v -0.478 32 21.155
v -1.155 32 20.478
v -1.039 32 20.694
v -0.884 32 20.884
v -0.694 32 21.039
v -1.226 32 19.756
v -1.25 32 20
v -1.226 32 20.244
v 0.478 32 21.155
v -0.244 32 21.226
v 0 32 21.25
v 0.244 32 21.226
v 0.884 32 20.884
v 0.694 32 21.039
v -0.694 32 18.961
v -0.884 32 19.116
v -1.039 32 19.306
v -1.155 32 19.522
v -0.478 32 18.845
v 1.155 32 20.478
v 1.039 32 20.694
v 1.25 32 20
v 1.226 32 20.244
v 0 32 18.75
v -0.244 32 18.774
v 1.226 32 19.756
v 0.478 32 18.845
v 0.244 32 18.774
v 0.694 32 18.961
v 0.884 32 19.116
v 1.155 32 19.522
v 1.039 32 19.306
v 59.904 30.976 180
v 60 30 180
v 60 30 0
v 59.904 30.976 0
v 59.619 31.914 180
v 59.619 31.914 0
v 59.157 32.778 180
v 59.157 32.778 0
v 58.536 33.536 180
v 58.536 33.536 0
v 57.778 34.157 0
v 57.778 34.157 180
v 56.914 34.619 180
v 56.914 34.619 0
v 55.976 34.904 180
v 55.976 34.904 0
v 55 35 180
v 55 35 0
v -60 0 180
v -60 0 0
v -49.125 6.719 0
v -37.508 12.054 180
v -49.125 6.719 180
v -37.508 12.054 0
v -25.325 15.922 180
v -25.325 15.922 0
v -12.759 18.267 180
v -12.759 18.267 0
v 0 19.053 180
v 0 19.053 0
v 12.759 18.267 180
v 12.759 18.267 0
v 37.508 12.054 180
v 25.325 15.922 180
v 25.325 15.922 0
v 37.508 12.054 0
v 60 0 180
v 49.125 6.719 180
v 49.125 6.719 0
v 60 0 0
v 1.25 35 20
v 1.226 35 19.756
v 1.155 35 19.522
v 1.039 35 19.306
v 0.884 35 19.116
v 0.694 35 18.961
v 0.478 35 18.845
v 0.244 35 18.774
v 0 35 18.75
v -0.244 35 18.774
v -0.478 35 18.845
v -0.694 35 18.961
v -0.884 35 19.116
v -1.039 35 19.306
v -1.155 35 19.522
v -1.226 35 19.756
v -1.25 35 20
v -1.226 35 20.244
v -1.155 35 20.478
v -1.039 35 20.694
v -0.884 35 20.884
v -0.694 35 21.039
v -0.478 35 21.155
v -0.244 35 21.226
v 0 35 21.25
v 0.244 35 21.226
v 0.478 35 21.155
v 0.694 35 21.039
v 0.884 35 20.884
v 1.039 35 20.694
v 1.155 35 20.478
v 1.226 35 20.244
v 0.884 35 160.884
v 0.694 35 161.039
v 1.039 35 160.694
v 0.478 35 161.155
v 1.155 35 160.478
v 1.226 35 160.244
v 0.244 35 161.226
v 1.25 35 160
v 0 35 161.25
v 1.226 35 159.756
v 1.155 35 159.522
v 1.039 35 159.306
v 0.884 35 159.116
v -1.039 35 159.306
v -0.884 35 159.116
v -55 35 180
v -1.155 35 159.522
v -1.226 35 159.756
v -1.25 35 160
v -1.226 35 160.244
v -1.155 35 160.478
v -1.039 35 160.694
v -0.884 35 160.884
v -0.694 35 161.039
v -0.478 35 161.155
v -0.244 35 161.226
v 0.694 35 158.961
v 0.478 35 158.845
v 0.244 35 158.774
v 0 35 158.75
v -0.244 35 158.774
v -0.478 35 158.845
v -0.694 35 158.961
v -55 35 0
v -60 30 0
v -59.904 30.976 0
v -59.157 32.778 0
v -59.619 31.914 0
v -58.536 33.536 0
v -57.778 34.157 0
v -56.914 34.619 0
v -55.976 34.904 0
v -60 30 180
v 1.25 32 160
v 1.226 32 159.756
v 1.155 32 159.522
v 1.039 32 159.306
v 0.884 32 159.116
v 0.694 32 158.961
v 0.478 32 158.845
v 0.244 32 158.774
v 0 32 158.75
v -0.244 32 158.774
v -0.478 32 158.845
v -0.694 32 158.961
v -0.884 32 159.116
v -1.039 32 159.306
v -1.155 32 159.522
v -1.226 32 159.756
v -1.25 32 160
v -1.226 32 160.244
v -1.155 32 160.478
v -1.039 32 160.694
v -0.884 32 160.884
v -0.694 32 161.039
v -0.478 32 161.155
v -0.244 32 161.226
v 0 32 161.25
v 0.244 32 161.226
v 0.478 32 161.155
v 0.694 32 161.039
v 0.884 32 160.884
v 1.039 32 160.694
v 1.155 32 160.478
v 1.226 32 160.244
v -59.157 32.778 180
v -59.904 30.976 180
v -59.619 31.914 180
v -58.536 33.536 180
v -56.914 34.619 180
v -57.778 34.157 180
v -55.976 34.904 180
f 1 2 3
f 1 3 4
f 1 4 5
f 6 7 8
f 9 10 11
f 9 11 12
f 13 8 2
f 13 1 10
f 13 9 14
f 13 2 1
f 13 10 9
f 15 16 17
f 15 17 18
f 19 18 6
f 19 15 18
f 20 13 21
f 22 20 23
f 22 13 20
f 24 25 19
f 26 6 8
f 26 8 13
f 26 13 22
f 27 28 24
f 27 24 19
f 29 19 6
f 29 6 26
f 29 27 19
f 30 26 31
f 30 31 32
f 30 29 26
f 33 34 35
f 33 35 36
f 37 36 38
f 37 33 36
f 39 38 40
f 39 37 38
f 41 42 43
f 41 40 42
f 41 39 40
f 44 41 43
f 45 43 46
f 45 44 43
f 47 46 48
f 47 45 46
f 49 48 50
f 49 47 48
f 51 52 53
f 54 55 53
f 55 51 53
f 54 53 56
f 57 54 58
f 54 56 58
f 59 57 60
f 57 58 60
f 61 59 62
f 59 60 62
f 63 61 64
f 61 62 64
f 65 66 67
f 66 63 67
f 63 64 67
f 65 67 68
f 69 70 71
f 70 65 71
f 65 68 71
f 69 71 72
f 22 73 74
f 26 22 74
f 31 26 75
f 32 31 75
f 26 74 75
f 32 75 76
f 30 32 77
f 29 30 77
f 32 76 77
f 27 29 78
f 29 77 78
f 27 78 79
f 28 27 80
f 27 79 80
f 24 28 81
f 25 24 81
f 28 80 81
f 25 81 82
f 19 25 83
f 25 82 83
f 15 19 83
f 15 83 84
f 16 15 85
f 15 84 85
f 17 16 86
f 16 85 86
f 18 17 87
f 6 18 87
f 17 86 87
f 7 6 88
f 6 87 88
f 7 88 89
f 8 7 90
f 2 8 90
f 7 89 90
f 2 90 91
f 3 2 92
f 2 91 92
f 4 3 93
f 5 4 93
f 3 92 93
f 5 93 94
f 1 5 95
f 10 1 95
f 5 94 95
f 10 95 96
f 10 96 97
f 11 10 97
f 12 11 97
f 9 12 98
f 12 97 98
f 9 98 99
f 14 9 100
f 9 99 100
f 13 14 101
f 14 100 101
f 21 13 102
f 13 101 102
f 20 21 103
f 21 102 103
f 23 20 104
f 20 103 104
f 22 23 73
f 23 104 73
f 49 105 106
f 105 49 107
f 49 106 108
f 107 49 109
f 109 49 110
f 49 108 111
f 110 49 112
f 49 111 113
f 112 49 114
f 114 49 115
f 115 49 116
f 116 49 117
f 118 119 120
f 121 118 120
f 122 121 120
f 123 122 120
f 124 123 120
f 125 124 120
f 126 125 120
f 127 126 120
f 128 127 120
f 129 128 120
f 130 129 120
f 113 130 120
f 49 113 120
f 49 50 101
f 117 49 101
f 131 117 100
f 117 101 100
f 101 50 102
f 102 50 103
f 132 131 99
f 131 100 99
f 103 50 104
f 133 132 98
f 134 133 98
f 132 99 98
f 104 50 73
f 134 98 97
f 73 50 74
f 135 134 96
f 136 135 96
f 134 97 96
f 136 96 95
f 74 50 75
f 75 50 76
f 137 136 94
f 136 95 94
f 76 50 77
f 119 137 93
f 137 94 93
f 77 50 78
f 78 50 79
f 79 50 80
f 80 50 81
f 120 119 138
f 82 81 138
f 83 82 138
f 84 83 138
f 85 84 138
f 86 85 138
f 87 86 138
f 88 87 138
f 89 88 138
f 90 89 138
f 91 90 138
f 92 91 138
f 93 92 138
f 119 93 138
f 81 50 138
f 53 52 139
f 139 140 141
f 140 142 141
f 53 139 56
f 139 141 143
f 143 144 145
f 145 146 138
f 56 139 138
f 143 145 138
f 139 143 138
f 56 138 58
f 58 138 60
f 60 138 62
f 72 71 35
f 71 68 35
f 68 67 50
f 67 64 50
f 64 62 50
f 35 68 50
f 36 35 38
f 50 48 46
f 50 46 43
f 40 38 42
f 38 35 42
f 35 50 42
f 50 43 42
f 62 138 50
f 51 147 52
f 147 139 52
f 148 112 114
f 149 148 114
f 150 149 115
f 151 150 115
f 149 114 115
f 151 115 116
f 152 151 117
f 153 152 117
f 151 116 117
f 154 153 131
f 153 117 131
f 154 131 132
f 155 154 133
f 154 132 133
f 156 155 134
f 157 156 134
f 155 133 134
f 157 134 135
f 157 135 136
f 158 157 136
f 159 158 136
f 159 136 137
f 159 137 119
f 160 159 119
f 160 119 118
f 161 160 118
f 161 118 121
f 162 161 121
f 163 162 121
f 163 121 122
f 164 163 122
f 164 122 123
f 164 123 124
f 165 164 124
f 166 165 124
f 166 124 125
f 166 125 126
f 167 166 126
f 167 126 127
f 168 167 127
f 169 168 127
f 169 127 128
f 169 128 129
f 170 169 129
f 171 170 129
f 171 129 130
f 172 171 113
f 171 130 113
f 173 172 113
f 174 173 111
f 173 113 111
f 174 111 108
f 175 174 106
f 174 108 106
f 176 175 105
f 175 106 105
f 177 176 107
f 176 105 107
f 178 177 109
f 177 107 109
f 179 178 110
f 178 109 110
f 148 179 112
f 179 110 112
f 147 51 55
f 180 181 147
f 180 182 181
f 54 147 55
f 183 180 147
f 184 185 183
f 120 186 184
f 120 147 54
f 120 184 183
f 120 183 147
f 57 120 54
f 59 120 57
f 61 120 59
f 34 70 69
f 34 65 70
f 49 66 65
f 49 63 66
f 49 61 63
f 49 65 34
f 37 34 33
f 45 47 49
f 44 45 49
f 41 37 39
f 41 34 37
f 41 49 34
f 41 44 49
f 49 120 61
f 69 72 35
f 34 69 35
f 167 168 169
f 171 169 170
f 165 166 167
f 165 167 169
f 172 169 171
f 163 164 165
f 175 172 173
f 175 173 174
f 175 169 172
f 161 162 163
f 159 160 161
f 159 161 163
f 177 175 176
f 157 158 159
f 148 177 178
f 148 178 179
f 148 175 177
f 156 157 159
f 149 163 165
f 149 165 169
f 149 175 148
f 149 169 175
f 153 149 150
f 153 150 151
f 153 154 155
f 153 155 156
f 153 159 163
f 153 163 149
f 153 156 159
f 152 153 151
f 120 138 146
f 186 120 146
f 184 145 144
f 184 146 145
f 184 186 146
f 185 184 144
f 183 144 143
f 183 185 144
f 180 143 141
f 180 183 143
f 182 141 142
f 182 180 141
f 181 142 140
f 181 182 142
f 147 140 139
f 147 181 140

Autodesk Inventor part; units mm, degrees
ref_plane "YZ Plane" through (0, 0, 0) normal (1, 0, 0) x (0, 1, 0)
ref_plane "XZ Plane" through (0, 0, 0) normal (0, 1, 0) x (-1, 0, 0)
ref_plane "XY Plane" through (0, 0, 0) normal (0, 0, 1) x (1, 0, 0)
sketch "Sketch1" plane through (0, 0, 0) normal (0, 0, 1) x (1, 0, 0)
  arc A0 (60, 0) -> (-60, 0) centre (0, -84.947) ccw
  line L0 (60, 0) -> (60, 30)
  line L1 (60, 30) -> (60, 35)
  line L2 (-60, 35) -> (-60, 0)
  line L3 (60, 35) -> (-60, 35)
  point P0 (0, 0)
  dimension "d2" = 104
  dimension "d9" = 30
  dimension "d10" = 5
extrude "Extrusion1" add sketch "Sketch1" along normal blind 180
fillet "Fillet5" radius 5 2 edges at (-60, 35, 90) (60, 35, 90)
sketch "Sketch5" plane through (-55, 35, 0) normal (0, 1, 0) x (1, 0, 0)
  line L0 (115, -180) -> (-5, -180) projected
  circle A0 centre (55, -160) radius 1.25
  circle A1 centre (55, -20) radius 1.25
  point P0 (55, 0)
extrude "Extrusion5" cut sketch "Sketch5" against normal blind 3
thread "Thread4" size "M2.5x0.45" class "6H" standard "ANSI Metric M Profile" full length
thread "Thread5" size "M2.5x0.45" class "6H" standard "ANSI Metric M Profile" full length
properties part number "NEW Dudukan di Bearring"
